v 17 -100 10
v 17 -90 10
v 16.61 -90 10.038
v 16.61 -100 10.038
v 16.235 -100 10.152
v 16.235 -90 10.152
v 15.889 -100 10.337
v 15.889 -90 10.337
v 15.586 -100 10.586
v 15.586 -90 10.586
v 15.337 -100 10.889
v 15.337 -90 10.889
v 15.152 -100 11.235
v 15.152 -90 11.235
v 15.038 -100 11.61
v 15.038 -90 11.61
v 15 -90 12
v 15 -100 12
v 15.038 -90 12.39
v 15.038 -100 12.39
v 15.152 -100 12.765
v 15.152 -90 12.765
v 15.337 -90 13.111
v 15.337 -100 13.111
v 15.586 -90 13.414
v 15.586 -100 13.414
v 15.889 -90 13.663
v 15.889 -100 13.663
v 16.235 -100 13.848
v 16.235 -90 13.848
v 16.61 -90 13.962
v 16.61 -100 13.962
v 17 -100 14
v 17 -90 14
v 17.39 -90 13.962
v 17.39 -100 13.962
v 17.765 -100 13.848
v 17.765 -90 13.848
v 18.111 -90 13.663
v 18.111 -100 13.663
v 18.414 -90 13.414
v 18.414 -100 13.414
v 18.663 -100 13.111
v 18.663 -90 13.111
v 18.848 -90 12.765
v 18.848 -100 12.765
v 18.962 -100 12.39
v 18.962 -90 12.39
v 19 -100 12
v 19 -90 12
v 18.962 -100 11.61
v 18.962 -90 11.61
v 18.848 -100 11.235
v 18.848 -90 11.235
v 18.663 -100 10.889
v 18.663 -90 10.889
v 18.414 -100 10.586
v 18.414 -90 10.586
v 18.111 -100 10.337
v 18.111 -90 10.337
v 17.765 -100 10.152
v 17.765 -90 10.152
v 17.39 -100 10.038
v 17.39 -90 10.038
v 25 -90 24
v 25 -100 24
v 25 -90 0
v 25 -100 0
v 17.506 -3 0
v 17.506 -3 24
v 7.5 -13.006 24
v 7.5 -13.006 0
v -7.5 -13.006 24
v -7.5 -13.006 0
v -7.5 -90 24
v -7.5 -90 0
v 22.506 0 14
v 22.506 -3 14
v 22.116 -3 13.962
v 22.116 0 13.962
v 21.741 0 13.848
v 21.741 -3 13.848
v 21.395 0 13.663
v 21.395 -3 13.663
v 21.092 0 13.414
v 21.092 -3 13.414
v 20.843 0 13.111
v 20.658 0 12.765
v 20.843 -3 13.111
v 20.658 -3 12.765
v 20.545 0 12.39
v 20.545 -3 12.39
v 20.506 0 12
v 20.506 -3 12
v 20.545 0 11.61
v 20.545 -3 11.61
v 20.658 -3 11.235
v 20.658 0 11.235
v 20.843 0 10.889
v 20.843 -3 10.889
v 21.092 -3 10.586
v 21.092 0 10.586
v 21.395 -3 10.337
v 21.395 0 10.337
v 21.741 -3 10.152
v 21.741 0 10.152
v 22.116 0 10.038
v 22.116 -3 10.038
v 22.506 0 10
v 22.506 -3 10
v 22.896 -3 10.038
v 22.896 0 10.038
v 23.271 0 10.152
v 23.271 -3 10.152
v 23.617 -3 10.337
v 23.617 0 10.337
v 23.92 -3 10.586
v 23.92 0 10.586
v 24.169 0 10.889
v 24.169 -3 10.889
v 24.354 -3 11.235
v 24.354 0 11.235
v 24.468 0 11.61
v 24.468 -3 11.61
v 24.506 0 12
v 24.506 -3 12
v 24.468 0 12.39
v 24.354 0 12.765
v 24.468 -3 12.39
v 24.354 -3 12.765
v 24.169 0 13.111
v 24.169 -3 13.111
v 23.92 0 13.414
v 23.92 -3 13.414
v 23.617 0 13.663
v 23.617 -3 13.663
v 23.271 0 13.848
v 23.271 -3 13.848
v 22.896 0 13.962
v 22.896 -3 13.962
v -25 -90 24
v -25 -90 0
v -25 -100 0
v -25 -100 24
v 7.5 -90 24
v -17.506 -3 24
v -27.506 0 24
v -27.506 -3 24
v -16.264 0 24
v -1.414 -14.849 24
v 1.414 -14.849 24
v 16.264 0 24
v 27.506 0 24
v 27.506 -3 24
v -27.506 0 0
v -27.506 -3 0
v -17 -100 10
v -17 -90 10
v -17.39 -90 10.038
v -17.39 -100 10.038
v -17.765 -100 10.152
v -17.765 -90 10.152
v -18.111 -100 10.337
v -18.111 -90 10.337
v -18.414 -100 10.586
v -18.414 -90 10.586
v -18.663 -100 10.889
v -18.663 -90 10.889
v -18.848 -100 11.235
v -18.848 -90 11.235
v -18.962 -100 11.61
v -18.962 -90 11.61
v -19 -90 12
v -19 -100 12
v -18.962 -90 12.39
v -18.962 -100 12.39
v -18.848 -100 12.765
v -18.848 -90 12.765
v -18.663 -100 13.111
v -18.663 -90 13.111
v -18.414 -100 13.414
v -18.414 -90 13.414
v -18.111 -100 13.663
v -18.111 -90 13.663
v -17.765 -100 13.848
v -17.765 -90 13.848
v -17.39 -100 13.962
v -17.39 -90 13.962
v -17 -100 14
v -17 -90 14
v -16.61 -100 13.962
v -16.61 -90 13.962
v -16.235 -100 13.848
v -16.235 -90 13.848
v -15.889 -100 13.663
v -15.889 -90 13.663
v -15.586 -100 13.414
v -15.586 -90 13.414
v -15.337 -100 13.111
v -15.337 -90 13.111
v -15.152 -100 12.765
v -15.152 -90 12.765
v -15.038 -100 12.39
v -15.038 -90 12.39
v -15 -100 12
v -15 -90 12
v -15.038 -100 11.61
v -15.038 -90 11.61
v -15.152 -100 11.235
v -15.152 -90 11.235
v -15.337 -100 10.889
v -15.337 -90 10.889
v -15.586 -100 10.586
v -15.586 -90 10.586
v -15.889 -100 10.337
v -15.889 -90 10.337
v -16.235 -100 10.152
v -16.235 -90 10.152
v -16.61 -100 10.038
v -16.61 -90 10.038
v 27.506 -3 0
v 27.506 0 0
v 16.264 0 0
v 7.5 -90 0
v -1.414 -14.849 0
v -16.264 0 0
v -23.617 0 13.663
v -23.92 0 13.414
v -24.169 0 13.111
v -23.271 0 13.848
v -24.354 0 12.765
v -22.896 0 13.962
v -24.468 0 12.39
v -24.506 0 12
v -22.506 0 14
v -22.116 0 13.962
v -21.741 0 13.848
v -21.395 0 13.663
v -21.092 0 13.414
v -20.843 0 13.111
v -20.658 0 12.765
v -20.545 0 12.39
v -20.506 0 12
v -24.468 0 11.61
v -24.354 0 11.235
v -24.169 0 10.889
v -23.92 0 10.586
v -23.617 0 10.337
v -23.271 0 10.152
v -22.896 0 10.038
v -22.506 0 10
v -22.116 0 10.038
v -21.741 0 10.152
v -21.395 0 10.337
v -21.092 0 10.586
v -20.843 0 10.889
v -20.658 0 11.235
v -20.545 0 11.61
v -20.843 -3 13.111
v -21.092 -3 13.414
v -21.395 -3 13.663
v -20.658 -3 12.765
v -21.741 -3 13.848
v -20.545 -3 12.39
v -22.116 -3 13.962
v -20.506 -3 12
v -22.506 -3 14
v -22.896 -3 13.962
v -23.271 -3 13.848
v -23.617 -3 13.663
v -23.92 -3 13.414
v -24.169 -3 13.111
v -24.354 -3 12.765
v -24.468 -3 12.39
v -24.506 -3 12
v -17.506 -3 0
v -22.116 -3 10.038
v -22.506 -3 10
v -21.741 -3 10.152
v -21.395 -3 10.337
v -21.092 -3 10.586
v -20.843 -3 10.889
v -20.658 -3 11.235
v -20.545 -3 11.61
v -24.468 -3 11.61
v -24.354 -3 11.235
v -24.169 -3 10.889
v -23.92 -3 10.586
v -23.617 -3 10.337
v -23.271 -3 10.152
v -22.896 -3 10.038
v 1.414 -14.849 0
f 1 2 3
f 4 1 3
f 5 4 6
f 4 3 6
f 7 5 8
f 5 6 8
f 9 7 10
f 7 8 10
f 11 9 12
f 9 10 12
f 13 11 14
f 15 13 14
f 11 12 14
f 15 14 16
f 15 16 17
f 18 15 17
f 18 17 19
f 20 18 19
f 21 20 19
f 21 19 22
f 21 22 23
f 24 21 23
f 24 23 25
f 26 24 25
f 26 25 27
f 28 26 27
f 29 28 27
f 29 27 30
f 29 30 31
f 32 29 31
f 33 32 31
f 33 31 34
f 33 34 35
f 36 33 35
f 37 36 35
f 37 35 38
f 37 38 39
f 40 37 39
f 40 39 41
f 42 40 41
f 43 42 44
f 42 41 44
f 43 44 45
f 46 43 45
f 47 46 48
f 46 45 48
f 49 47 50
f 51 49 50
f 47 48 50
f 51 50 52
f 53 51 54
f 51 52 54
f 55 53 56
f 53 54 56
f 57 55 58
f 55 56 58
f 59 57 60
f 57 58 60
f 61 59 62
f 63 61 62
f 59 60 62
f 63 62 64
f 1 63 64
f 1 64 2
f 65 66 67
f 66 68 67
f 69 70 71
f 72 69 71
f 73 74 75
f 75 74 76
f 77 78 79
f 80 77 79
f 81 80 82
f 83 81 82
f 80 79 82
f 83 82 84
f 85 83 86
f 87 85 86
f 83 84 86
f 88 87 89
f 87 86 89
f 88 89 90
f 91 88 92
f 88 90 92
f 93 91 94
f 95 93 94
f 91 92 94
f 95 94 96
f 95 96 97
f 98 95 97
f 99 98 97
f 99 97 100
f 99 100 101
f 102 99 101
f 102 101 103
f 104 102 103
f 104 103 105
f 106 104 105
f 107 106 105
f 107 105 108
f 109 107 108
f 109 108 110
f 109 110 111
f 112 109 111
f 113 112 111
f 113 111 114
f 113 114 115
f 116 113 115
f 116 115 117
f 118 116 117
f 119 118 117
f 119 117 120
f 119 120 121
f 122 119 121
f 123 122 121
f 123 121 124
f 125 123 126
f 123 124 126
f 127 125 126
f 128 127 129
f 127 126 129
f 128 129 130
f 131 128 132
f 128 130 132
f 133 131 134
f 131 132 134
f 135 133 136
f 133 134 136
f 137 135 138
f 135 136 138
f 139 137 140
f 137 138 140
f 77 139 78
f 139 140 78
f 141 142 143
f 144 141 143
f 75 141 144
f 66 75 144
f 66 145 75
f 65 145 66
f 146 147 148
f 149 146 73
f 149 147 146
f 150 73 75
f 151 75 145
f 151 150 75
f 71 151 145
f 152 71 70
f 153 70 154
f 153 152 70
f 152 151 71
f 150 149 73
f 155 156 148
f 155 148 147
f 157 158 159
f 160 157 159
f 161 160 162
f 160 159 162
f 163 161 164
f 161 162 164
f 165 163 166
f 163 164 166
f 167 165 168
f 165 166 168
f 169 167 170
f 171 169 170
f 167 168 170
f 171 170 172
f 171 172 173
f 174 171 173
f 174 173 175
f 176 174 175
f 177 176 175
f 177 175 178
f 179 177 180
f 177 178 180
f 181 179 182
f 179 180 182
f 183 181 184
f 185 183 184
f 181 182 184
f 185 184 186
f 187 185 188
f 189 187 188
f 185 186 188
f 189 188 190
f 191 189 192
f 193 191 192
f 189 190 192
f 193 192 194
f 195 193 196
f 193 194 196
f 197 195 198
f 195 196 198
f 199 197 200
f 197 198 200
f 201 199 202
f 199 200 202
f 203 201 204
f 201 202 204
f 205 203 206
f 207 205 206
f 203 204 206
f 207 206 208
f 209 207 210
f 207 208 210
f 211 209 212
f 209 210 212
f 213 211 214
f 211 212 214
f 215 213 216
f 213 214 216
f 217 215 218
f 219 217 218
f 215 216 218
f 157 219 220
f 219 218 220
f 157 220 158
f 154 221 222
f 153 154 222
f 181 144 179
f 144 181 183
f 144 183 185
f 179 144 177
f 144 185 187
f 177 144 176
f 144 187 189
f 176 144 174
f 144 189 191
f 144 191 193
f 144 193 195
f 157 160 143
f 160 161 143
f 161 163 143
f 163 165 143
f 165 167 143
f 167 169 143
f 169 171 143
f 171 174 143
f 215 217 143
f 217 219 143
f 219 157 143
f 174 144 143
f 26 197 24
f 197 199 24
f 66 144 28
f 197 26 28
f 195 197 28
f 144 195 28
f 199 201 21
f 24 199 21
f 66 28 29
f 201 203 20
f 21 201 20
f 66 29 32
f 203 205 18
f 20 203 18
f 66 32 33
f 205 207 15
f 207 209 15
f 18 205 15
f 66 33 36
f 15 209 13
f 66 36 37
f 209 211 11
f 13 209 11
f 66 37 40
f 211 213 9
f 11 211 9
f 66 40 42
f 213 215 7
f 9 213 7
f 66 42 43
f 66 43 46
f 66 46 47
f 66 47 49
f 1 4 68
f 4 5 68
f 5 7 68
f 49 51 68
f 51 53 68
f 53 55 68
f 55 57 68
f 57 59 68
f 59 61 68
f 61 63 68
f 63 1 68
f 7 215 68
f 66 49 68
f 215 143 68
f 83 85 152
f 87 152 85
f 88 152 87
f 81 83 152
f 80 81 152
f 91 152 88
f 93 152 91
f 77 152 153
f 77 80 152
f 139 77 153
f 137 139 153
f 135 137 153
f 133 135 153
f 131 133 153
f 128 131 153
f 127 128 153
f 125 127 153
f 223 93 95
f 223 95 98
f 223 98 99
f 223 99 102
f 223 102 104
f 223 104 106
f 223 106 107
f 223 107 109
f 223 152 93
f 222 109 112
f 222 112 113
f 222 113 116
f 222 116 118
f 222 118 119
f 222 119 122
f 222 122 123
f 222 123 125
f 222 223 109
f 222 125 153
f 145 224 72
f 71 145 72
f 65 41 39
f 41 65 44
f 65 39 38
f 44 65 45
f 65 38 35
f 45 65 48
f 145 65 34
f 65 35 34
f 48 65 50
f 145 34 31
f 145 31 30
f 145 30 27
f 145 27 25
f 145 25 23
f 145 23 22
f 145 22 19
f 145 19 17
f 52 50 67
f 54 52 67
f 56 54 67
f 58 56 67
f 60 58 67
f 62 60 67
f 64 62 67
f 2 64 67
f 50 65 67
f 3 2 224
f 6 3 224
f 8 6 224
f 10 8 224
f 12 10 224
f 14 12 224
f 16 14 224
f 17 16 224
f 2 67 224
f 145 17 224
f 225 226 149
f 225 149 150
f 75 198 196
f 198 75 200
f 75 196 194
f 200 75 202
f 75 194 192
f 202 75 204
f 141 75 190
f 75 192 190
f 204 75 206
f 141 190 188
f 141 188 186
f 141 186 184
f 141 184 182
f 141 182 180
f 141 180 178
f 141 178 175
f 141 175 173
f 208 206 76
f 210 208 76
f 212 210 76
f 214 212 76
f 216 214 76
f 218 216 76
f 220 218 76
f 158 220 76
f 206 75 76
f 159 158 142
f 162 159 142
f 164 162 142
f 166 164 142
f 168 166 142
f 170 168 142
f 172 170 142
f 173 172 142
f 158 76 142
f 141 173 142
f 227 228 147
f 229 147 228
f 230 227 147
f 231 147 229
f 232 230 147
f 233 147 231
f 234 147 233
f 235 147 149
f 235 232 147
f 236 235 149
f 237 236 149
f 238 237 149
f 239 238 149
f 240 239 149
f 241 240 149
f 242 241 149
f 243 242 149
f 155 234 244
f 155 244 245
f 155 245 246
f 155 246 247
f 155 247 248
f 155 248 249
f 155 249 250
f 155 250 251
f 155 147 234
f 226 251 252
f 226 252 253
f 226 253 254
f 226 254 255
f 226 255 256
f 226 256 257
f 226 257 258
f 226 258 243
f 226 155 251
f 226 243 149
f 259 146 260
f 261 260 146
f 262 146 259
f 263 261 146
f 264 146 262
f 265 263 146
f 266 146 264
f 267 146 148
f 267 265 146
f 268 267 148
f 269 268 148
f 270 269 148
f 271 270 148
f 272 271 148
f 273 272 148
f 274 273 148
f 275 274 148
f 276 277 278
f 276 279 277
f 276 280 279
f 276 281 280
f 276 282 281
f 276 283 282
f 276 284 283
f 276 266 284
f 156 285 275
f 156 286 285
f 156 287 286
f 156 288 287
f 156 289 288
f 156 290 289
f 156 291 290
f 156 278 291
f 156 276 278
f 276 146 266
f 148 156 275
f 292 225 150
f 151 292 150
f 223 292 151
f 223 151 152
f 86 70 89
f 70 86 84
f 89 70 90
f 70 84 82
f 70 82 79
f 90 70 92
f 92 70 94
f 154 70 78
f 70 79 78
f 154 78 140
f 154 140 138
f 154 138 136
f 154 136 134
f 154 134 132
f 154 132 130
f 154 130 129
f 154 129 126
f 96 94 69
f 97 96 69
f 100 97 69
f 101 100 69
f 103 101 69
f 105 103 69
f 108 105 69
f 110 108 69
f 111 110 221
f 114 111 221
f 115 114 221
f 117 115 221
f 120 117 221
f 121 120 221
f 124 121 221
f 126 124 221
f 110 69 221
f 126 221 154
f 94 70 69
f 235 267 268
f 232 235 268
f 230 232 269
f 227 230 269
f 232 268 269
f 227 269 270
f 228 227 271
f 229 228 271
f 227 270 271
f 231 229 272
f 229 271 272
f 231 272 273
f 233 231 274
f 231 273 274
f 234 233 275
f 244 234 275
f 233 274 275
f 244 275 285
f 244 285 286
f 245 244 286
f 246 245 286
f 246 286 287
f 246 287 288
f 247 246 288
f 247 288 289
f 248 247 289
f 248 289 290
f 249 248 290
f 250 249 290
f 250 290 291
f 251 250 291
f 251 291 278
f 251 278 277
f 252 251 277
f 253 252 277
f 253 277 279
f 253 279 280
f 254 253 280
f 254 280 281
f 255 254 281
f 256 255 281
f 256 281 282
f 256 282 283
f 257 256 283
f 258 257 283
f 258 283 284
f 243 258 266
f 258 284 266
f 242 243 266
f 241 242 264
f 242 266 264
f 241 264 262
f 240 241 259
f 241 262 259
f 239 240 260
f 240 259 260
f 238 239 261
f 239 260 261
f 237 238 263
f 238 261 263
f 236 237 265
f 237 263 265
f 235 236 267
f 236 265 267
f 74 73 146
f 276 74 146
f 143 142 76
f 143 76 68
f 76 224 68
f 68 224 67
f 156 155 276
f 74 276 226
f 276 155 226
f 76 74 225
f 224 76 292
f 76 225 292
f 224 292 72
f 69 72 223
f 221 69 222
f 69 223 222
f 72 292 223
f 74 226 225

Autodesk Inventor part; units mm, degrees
ref_plane "YZ Plane" through (0, 0, 0) normal (1, 0, 0) x (0, 1, 0)
ref_plane "XZ Plane" through (0, 0, 0) normal (0, 1, 0) x (-1, 0, 0)
ref_plane "XY Plane" through (0, 0, 0) normal (0, 0, 1) x (1, 0, 0)
sketch "Sketch1" plane through (0, 0, 0) normal (0, 0, 1) x (1, 0, 0)
  line L0 (0, -124.1012) -> (0, 44.6073) projected
  line L1 (0, 44.6073) -> (0, -124.1012) projected
  line L2 (-38.5085, 0) -> (38.5085, 0) projected
  line L3 (0, -16.2635) -> (16.2635, 0)
  line L4 (16.2635, 0) -> (0, 16.2635)
  line L5 (0, 16.2635) -> (-16.2635, 0)
  line L6 (-16.2635, 0) -> (0, -16.2635)
  line L7 (0, -16.2635) -> (0, 16.2635) construction
  line L8 (16.2635, 0) -> (-16.2635, 0) construction
  line L9 (0, -16.2635) -> (23, -16.2635) construction
  line L10 (0, -20.5061) -> (-17.5061, -3)
  line L11 (-17.5061, -3) -> (-27.5061, -3)
  line L12 (-27.5061, -3) -> (-27.5061, 3)
  line L13 (-27.5061, 3) -> (-17.5061, 3)
  line L14 (-17.5061, 3) -> (0, 20.5061)
  line L15 (0, 20.5061) -> (17.5061, 3)
  line L16 (17.5061, -3) -> (0, -20.5061)
  line L17 (-38.5085, 0) -> (38.5085, 0) projected
  line L18 (-27.5061, 0) -> (-16.2635, 0)
  line L19 (16.2635, 0) -> (23.5061, 0)
  line L20 (17.5061, -3) -> (27.5061, -3)
  line L21 (27.5061, -3) -> (27.5061, 3)
  line L22 (27.5061, 3) -> (17.5061, 3)
  line L23 (16.2635, 0) -> (27.5061, 0)
  line L24 (-7.5, -13.0061) -> (-7.5, -90)
  line L25 (-7.5, -90) -> (-25, -90)
  line L26 (-25, -90) -> (-25, -100)
  line L27 (-25, -100) -> (25, -100)
  line L28 (25, -100) -> (25, -90)
  line L29 (25, -90) -> (7.5, -90)
  line L30 (7.5, -90) -> (7.5, -13.0061)
  point P0 (0, 0)
  point P1 (-16.2635, 0)
  point P2 (16.2635, 0)
  point P3 (27.5061, 0)
  point P4 (16.2635, 0)
  point P5 (-16.2635, 0)
  dimension "d34" = 23
  dimension "d35" = 45
  dimension "d36" = 23
  dimension "d37" = 3
  dimension "d38" = 3
  dimension "d39" = 45
  dimension "d41" = 6
  dimension "d49" = 10
  dimension "d50" = 6
  dimension "d51" = 3
  dimension "d52" = 10
  dimension "d69" = 15
  dimension "d70" = 50
  dimension "d71" = 10
  dimension "d72" = 100
extrude "Extrusion3" add sketch "Sketch1" along normal blind 24 contours L10 L11 L12 L2 L6 L0 | L16 L30 L29 L28 L27 L0 | L0 L27 L26 L25 L24 L10 | L0 L3 L2 L21 L20 L16
sketch "Sketch4" plane through (-27.5061, 0, 0) normal (0, 1, 0) x (1, 0, 0)
  line L0 (11.2426, 0) -> (0, 0) projected
  line L1 (55.0122, 0) -> (43.7696, 0) projected
  line L2 (0, 0) -> (0, -24) projected
  line L3 (55.0122, 0) -> (55.0122, -24) projected
  point P0 (27.5061, 0)
  point P1 (5, -12)
  point P2 (50.0122, -12)
  dimension "d75" = 12
  dimension "d76" = 12
  dimension "d77" = 5
  dimension "d78" = 5
hole "Hole2" at (-22.5061, 0, 12) at (22.5061, 0, 12) direction (0, -1, 0) diameter 4 depth 3
chamfer "Chamfer2" distance 2 angle 45 1 edges at (0, -16.2635, 12)
sketch "Sketch5" plane through (-25, -100, 0) normal (0, -1, 0) x (1, 0, 0)
  line L0 (-2.5061, 0) -> (-2.5061, 24) projected
  line L1 (52.5061, 0) -> (52.5061, 24) projected
  line L2 (0, 24) -> (50, 24) projected
  line L3 (0, 0) -> (0, 24) projected
  line L4 (50, 0) -> (50, 24) projected
  point P0 (25, 0)
  point P1 (8, 12)
  point P2 (42, 12)
  dimension "d91" = 12
  dimension "d92" = 12
  dimension "d93" = 8
  dimension "d94" = 8
hole "Hole3" at (-17, -100, 12) at (17, -100, 12) direction (0, 1, 0) diameter 4 depth 10
properties part number "Fan_bottom_3DPrint"
